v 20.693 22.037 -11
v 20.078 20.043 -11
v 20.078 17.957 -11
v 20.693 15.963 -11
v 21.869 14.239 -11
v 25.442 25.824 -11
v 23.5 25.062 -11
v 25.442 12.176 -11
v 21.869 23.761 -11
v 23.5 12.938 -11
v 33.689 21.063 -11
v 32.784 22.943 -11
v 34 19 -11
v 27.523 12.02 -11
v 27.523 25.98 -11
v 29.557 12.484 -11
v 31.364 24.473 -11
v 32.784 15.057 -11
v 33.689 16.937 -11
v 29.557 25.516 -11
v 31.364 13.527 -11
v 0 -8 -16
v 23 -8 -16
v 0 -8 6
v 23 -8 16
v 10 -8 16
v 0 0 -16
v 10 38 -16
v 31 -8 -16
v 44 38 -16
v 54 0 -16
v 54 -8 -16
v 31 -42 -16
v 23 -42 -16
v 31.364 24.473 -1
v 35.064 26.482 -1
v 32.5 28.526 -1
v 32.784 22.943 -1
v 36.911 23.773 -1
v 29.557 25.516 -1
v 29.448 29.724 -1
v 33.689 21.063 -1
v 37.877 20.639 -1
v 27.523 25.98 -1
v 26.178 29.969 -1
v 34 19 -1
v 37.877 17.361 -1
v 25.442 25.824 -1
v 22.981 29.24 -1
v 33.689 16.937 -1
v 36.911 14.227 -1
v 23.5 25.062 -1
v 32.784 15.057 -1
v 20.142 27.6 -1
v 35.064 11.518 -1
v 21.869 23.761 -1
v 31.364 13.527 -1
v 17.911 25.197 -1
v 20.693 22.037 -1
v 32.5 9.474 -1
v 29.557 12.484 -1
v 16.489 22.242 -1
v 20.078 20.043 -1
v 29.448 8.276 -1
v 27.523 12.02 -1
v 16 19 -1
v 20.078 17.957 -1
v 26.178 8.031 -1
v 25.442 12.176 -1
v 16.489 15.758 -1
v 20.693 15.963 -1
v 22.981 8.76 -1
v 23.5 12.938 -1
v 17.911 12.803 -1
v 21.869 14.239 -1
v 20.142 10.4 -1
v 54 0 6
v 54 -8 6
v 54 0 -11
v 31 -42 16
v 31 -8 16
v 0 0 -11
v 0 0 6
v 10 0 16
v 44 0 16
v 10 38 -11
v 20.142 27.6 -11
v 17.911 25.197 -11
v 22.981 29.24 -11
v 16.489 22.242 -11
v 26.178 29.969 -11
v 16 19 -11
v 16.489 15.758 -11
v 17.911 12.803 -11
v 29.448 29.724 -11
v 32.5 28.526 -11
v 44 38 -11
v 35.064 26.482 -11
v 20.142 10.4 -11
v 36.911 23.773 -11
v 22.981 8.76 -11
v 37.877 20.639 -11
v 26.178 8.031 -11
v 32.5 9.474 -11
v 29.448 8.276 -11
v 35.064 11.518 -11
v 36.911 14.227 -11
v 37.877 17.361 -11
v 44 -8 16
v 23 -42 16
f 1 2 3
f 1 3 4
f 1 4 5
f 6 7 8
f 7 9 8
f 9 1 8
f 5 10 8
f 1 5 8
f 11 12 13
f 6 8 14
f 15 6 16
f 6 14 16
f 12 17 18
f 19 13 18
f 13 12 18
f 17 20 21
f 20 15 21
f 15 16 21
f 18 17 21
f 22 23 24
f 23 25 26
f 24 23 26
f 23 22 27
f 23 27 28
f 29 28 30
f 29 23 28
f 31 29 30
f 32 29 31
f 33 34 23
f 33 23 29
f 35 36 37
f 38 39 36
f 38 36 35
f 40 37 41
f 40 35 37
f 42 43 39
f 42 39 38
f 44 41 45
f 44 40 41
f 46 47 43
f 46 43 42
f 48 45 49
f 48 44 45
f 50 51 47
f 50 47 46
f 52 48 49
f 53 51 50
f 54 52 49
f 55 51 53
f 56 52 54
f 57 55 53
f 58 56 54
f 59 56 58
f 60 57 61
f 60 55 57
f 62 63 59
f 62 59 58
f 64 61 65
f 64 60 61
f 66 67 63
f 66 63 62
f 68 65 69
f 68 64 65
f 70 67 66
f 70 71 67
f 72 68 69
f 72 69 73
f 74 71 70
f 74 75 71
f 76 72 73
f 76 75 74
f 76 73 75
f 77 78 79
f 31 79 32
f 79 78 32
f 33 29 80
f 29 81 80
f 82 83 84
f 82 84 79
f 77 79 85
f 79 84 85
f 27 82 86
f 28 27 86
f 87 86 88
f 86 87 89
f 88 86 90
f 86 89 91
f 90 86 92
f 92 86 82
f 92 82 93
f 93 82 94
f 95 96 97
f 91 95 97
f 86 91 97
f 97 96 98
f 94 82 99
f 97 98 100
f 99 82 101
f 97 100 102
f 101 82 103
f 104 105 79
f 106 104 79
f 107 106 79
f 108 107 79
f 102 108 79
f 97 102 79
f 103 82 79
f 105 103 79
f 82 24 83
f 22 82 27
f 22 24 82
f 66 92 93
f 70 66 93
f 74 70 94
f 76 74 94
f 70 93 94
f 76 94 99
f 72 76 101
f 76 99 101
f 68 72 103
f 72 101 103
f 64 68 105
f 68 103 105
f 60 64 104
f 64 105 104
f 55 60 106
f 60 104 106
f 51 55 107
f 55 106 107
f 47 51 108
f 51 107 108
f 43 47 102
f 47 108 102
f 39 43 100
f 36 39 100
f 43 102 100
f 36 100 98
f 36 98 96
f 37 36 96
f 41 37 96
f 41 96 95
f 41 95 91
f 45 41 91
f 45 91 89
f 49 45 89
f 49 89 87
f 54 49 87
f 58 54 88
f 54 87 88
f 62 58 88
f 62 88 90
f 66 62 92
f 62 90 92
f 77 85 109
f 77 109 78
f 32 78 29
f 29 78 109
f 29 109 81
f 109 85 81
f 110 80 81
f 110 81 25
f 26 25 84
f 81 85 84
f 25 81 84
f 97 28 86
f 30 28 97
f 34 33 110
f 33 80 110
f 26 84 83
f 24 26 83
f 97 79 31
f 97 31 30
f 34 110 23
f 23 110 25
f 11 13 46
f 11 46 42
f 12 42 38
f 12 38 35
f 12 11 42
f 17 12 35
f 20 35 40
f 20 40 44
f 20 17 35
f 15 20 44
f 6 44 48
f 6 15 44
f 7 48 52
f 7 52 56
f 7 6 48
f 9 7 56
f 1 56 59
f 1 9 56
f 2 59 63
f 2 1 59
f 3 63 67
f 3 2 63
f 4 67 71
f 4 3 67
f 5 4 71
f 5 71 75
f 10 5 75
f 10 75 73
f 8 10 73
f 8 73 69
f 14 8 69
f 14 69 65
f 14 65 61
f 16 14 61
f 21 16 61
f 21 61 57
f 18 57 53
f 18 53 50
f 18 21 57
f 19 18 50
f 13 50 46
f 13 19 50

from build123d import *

# Parameters (mm, degrees)
BOSS_EXTRUDE1_DEPTH = 16
SKETCH3_W           = 54
SKETCH3_H           = 5
BOSS_EXTRUDE2_DEPTH = 38
CUT_EXTRUDE4_DEPTH  = 10
SKETCH10_R          = 11
SKETCH10_R_2        = 7
BOSS_EXTRUDE4_DEPTH = 10
CUT_EXTRUDE5_DEPTH  = 10


with BuildPart() as part:
    # Sketch1 → Boss-Extrude1 (new, symmetric)
    with BuildSketch(Plane.XY):
        Polygon((0, 0), (54, 0), (54, -8), (31, -8), (31, -42), (23, -42), (23, -8), (0, -8), align=None)
    extrude(amount=BOSS_EXTRUDE1_DEPTH, both=True)

    # Sketch3 → Boss-Extrude2 (add)
    with BuildSketch(Plane(origin=(0, 0, 0), x_dir=(1, 0, 0), z_dir=(0, 1, 0))):
        with Locations((27, 13.5)):
            Rectangle(SKETCH3_W, SKETCH3_H)
    extrude(amount=BOSS_EXTRUDE2_DEPTH)

    # Sketch5 → Cut-Extrude4 (cut)
    with BuildSketch(Plane(origin=(0, 0, 0), x_dir=(1, 0, 0), z_dir=(0, 1, 0))):
        Polygon((44, -16), (54, -6), (54, -16), align=None)
        Polygon((10, -16), (0, -6), (0, -16), align=None)
    extrude(amount=-CUT_EXTRUDE4_DEPTH, mode=Mode.SUBTRACT)

    # Sketch10 → Boss-Extrude4 (add)
    with BuildSketch(Plane.XY.offset(-11)):
        with Locations(Location((27, 19, 0), (0, 0, 180))):
            Circle(SKETCH10_R)
        with Locations((27, 19)):
            Circle(SKETCH10_R_2, mode=Mode.SUBTRACT)
    extrude(amount=BOSS_EXTRUDE4_DEPTH)

    # Sketch12 → Cut-Extrude5 (cut)
    with BuildSketch(Plane.XY.offset(-11)):
        Polygon((0, 0), (10, 38), (0, 38), align=None)
        Polygon((44, 38), (54, 38), (54, 0), align=None)
    extrude(amount=-CUT_EXTRUDE5_DEPTH, mode=Mode.SUBTRACT)


solid = part.part
